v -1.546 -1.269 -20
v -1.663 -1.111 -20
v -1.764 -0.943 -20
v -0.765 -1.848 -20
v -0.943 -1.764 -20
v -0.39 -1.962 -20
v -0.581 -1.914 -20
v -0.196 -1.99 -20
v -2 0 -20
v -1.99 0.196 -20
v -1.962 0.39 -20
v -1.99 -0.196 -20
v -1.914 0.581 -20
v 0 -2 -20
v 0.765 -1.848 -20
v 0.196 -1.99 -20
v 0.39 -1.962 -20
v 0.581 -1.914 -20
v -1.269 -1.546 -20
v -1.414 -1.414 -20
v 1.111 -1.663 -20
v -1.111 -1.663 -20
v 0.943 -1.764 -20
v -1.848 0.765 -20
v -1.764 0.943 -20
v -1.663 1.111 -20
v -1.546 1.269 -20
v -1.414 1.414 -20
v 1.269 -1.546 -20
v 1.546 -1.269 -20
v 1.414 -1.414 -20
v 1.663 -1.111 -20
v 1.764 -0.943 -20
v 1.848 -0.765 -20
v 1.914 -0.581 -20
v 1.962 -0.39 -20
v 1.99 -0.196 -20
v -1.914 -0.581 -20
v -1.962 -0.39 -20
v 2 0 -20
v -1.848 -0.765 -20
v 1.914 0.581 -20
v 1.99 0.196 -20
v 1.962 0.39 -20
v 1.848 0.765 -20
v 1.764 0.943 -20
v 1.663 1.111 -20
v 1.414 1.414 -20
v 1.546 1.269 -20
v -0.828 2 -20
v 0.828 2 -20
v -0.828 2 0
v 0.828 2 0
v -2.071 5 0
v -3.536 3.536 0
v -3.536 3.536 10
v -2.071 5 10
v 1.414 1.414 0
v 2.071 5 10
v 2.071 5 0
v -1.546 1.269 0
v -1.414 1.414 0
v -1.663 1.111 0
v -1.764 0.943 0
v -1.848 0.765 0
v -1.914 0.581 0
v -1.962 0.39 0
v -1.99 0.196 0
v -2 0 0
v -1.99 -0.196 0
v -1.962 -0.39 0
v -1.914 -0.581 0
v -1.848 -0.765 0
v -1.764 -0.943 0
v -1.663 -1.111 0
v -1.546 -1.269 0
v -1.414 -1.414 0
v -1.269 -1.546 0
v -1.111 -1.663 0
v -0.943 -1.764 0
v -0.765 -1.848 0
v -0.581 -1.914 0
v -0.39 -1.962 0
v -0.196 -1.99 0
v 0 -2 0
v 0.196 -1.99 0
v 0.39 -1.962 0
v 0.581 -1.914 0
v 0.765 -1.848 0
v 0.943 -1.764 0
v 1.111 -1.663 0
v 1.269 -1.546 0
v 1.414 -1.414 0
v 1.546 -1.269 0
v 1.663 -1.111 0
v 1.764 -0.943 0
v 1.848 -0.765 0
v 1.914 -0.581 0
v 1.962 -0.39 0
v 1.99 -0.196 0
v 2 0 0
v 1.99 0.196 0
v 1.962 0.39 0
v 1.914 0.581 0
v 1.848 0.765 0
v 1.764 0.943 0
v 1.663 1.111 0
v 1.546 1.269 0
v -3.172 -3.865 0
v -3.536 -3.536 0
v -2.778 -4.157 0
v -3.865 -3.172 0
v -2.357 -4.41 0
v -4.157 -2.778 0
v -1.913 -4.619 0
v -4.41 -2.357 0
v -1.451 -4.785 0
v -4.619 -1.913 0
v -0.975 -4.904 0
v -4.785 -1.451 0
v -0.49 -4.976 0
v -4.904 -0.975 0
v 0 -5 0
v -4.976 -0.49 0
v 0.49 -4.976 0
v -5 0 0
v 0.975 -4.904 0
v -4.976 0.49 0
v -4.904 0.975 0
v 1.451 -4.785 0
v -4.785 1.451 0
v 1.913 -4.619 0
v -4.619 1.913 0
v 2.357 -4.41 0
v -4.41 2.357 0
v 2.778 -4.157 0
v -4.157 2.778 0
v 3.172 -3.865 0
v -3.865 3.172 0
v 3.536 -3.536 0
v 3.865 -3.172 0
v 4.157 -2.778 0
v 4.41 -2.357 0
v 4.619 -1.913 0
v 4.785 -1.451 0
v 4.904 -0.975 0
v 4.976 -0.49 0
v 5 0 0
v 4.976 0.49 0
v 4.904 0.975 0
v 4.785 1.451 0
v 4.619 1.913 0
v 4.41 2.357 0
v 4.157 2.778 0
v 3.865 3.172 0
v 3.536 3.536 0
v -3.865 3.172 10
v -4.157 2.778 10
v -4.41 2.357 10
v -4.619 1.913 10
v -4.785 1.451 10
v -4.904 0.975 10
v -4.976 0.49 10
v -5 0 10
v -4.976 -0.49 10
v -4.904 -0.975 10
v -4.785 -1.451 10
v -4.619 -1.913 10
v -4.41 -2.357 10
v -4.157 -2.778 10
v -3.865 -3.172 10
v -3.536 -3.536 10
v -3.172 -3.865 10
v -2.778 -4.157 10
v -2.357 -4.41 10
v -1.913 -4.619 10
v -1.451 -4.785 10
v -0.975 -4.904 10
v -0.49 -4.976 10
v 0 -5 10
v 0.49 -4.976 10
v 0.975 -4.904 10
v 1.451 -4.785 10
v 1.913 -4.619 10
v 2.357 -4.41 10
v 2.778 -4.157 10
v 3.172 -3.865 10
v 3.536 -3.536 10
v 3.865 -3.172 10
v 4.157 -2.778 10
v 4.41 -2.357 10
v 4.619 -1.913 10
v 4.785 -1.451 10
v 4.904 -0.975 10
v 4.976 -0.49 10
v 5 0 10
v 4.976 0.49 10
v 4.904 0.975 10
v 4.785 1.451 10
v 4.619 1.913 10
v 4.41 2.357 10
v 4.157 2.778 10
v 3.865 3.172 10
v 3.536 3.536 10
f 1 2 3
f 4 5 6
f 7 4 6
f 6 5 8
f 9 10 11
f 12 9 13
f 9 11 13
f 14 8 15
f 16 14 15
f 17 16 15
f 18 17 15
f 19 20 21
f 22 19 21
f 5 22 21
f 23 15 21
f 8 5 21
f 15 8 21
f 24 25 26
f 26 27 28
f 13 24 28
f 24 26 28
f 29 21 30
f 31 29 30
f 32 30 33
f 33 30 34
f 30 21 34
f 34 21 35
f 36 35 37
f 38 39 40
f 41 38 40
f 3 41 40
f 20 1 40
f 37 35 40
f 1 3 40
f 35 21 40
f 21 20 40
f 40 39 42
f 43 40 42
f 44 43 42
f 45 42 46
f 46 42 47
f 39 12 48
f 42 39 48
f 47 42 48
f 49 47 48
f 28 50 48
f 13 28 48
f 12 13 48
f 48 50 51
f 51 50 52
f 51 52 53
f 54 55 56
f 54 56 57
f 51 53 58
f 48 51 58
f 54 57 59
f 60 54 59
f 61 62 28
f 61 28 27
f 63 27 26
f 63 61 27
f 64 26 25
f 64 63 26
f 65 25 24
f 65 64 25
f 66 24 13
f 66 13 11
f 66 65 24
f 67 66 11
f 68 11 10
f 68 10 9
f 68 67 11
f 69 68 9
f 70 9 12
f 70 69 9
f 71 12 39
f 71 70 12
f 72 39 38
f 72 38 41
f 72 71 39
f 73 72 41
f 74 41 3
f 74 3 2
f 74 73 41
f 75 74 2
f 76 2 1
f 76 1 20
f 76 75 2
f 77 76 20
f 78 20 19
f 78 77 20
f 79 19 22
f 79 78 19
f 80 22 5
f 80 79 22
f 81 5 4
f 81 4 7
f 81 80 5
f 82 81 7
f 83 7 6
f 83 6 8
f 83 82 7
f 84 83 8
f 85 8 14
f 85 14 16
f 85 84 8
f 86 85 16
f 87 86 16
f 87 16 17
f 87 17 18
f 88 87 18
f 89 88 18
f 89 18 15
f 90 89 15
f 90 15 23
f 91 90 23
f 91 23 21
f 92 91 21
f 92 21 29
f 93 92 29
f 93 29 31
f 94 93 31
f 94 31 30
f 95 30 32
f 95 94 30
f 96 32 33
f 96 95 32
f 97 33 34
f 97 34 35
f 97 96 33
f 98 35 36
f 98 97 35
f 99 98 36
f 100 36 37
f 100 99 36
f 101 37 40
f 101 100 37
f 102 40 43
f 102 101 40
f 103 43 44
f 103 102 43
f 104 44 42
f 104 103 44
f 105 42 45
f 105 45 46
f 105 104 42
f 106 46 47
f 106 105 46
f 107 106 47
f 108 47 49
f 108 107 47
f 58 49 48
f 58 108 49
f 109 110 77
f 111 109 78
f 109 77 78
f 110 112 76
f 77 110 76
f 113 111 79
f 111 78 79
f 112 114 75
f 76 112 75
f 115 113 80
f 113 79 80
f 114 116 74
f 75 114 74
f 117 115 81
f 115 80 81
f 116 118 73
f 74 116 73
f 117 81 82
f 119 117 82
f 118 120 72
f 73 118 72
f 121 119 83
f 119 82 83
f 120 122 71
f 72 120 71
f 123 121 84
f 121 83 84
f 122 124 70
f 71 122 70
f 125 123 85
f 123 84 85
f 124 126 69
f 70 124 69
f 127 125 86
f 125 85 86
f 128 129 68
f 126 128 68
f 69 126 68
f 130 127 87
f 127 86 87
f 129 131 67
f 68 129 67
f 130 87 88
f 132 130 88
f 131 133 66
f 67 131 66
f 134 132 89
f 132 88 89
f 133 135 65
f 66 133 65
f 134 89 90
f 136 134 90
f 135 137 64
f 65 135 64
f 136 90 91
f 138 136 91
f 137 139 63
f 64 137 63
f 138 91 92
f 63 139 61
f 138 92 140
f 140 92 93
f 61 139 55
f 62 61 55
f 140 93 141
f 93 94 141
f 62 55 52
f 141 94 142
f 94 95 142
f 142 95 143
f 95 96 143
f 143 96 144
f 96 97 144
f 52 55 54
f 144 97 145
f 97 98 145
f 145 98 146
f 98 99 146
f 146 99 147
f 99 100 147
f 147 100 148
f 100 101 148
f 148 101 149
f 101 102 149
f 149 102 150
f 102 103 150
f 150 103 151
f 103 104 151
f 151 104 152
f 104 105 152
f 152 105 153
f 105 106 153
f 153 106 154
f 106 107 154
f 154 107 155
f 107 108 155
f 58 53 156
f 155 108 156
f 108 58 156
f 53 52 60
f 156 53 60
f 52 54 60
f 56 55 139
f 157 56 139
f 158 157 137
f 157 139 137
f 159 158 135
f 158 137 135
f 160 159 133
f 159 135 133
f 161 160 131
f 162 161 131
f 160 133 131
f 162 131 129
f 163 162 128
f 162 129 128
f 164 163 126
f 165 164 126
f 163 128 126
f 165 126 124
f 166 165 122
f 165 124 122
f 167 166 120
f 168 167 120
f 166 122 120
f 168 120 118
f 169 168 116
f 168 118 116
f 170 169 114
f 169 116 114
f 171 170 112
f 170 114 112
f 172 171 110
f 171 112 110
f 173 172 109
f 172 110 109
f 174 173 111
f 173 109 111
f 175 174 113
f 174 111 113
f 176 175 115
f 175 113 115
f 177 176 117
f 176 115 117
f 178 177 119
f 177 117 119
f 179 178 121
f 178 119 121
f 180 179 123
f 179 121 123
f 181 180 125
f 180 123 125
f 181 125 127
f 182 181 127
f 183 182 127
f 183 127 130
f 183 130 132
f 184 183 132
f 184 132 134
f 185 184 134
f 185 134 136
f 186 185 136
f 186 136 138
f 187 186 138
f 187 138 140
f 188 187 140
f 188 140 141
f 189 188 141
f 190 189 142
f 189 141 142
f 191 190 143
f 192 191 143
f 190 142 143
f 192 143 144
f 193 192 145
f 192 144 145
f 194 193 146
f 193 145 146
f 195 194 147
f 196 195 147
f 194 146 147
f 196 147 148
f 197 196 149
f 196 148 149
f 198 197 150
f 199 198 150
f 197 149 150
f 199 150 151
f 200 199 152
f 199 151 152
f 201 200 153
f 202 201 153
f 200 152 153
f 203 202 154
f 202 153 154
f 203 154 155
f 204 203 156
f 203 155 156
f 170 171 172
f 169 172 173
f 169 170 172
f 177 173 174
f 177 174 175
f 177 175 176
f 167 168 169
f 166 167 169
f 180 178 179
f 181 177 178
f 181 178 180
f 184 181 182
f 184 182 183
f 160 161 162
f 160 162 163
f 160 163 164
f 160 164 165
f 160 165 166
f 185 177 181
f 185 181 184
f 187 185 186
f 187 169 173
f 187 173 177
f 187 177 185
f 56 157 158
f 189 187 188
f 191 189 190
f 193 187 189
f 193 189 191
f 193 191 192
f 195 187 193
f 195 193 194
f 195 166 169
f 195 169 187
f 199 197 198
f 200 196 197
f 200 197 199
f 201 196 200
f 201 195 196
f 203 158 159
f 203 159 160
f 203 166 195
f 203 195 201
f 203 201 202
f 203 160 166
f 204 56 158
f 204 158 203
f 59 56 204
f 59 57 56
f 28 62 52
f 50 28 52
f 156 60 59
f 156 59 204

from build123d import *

# Parameters (mm, degrees)
PAD003_DEPTH = 10
PAD002_DEPTH = 20


with BuildPart() as printbolthead001:
    # Sketch003 → Pad003 (new body)
    with BuildSketch(Plane.XY):
        with BuildLine():
            ThreePointArc((-3.535526, 3.535542), (-1.8e-05, -5), (3.535551, 3.535517))
            Line((2.071068, 5), (3.535551, 3.535517))
            Line((-2.071068, 5), (2.071068, 5))
            Line((-3.535526, 3.535542), (-2.071068, 5))
        make_face()
    extrude(amount=PAD003_DEPTH)


with BuildPart() as printboltslot:
    # Sketch002 → Pad002 (new body)
    with BuildSketch(Plane.XY):
        with BuildLine():
            ThreePointArc((-1.414208, 1.414219), (1e-06, -2), (1.414206, 1.414221))
            Line((0.828427, 2), (1.414206, 1.414221))
            Line((-0.828427, 2), (0.828427, 2))
            Line((-1.414208, 1.414219), (-0.828427, 2))
        make_face()
    extrude(amount=-PAD002_DEPTH)

    # Fusion001: union PrintBoltHead001
    add(printbolthead001.part)


solid = printboltslot.part
